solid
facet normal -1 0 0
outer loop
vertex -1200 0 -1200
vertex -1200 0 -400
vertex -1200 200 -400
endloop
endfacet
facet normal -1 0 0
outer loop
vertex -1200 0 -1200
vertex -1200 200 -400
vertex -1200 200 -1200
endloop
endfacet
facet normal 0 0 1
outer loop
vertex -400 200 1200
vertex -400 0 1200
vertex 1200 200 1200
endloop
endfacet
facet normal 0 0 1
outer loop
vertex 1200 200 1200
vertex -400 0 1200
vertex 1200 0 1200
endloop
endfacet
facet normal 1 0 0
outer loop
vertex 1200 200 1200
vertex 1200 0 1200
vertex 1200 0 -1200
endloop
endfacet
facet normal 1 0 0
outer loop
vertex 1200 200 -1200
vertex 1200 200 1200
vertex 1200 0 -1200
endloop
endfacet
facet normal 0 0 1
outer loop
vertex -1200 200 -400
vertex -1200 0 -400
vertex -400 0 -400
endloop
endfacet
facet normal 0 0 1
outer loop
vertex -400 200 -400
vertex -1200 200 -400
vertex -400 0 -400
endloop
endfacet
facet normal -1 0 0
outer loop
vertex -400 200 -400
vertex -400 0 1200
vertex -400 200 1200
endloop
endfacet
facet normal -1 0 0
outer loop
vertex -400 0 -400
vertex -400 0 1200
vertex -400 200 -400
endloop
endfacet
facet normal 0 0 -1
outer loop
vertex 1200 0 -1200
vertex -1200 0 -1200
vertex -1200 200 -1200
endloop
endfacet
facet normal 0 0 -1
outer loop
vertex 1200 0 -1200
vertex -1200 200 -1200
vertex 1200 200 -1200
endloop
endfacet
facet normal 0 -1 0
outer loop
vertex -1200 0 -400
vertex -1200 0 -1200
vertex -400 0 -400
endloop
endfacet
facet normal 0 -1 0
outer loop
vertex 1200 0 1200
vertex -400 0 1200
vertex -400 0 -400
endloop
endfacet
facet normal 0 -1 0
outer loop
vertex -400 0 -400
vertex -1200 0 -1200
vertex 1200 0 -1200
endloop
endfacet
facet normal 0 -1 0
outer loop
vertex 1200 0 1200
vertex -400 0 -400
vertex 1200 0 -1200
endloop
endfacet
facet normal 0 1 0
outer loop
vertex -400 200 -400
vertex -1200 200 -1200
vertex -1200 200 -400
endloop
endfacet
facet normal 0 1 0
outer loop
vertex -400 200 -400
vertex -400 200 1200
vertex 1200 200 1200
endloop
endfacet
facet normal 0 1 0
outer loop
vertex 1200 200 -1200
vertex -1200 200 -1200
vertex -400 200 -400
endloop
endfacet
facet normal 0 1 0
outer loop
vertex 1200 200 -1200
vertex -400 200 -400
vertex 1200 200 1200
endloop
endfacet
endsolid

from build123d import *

# Parameters (mm, degrees)
SKETCH_1_W          = 2400
SKETCH_1_H          = 2400
EXTRUDE_1_DEPTH     = 200
SKETCH_2_W          = 800
SKETCH_2_H          = 1600
CUT_EXTRUDE_1_DEPTH = 200


with BuildPart() as part:
    # 草图1 → 凸台-拉伸1 (new body)
    with BuildSketch(Plane(origin=(0, 0, 0), x_dir=(1, 0, 0), z_dir=(0, 1, 0))):
        Rectangle(SKETCH_1_W, SKETCH_1_H)
    extrude(amount=EXTRUDE_1_DEPTH)

    # 草图2 → 切除-拉伸1 (cut)
    with BuildSketch(Plane(origin=(0, 0, 0), x_dir=(1, 0, 0), z_dir=(0, 1, 0))):
        with Locations((-800, -400)):
            Rectangle(SKETCH_2_W, SKETCH_2_H)
    extrude(amount=CUT_EXTRUDE_1_DEPTH, mode=Mode.SUBTRACT)


solid = part.part
